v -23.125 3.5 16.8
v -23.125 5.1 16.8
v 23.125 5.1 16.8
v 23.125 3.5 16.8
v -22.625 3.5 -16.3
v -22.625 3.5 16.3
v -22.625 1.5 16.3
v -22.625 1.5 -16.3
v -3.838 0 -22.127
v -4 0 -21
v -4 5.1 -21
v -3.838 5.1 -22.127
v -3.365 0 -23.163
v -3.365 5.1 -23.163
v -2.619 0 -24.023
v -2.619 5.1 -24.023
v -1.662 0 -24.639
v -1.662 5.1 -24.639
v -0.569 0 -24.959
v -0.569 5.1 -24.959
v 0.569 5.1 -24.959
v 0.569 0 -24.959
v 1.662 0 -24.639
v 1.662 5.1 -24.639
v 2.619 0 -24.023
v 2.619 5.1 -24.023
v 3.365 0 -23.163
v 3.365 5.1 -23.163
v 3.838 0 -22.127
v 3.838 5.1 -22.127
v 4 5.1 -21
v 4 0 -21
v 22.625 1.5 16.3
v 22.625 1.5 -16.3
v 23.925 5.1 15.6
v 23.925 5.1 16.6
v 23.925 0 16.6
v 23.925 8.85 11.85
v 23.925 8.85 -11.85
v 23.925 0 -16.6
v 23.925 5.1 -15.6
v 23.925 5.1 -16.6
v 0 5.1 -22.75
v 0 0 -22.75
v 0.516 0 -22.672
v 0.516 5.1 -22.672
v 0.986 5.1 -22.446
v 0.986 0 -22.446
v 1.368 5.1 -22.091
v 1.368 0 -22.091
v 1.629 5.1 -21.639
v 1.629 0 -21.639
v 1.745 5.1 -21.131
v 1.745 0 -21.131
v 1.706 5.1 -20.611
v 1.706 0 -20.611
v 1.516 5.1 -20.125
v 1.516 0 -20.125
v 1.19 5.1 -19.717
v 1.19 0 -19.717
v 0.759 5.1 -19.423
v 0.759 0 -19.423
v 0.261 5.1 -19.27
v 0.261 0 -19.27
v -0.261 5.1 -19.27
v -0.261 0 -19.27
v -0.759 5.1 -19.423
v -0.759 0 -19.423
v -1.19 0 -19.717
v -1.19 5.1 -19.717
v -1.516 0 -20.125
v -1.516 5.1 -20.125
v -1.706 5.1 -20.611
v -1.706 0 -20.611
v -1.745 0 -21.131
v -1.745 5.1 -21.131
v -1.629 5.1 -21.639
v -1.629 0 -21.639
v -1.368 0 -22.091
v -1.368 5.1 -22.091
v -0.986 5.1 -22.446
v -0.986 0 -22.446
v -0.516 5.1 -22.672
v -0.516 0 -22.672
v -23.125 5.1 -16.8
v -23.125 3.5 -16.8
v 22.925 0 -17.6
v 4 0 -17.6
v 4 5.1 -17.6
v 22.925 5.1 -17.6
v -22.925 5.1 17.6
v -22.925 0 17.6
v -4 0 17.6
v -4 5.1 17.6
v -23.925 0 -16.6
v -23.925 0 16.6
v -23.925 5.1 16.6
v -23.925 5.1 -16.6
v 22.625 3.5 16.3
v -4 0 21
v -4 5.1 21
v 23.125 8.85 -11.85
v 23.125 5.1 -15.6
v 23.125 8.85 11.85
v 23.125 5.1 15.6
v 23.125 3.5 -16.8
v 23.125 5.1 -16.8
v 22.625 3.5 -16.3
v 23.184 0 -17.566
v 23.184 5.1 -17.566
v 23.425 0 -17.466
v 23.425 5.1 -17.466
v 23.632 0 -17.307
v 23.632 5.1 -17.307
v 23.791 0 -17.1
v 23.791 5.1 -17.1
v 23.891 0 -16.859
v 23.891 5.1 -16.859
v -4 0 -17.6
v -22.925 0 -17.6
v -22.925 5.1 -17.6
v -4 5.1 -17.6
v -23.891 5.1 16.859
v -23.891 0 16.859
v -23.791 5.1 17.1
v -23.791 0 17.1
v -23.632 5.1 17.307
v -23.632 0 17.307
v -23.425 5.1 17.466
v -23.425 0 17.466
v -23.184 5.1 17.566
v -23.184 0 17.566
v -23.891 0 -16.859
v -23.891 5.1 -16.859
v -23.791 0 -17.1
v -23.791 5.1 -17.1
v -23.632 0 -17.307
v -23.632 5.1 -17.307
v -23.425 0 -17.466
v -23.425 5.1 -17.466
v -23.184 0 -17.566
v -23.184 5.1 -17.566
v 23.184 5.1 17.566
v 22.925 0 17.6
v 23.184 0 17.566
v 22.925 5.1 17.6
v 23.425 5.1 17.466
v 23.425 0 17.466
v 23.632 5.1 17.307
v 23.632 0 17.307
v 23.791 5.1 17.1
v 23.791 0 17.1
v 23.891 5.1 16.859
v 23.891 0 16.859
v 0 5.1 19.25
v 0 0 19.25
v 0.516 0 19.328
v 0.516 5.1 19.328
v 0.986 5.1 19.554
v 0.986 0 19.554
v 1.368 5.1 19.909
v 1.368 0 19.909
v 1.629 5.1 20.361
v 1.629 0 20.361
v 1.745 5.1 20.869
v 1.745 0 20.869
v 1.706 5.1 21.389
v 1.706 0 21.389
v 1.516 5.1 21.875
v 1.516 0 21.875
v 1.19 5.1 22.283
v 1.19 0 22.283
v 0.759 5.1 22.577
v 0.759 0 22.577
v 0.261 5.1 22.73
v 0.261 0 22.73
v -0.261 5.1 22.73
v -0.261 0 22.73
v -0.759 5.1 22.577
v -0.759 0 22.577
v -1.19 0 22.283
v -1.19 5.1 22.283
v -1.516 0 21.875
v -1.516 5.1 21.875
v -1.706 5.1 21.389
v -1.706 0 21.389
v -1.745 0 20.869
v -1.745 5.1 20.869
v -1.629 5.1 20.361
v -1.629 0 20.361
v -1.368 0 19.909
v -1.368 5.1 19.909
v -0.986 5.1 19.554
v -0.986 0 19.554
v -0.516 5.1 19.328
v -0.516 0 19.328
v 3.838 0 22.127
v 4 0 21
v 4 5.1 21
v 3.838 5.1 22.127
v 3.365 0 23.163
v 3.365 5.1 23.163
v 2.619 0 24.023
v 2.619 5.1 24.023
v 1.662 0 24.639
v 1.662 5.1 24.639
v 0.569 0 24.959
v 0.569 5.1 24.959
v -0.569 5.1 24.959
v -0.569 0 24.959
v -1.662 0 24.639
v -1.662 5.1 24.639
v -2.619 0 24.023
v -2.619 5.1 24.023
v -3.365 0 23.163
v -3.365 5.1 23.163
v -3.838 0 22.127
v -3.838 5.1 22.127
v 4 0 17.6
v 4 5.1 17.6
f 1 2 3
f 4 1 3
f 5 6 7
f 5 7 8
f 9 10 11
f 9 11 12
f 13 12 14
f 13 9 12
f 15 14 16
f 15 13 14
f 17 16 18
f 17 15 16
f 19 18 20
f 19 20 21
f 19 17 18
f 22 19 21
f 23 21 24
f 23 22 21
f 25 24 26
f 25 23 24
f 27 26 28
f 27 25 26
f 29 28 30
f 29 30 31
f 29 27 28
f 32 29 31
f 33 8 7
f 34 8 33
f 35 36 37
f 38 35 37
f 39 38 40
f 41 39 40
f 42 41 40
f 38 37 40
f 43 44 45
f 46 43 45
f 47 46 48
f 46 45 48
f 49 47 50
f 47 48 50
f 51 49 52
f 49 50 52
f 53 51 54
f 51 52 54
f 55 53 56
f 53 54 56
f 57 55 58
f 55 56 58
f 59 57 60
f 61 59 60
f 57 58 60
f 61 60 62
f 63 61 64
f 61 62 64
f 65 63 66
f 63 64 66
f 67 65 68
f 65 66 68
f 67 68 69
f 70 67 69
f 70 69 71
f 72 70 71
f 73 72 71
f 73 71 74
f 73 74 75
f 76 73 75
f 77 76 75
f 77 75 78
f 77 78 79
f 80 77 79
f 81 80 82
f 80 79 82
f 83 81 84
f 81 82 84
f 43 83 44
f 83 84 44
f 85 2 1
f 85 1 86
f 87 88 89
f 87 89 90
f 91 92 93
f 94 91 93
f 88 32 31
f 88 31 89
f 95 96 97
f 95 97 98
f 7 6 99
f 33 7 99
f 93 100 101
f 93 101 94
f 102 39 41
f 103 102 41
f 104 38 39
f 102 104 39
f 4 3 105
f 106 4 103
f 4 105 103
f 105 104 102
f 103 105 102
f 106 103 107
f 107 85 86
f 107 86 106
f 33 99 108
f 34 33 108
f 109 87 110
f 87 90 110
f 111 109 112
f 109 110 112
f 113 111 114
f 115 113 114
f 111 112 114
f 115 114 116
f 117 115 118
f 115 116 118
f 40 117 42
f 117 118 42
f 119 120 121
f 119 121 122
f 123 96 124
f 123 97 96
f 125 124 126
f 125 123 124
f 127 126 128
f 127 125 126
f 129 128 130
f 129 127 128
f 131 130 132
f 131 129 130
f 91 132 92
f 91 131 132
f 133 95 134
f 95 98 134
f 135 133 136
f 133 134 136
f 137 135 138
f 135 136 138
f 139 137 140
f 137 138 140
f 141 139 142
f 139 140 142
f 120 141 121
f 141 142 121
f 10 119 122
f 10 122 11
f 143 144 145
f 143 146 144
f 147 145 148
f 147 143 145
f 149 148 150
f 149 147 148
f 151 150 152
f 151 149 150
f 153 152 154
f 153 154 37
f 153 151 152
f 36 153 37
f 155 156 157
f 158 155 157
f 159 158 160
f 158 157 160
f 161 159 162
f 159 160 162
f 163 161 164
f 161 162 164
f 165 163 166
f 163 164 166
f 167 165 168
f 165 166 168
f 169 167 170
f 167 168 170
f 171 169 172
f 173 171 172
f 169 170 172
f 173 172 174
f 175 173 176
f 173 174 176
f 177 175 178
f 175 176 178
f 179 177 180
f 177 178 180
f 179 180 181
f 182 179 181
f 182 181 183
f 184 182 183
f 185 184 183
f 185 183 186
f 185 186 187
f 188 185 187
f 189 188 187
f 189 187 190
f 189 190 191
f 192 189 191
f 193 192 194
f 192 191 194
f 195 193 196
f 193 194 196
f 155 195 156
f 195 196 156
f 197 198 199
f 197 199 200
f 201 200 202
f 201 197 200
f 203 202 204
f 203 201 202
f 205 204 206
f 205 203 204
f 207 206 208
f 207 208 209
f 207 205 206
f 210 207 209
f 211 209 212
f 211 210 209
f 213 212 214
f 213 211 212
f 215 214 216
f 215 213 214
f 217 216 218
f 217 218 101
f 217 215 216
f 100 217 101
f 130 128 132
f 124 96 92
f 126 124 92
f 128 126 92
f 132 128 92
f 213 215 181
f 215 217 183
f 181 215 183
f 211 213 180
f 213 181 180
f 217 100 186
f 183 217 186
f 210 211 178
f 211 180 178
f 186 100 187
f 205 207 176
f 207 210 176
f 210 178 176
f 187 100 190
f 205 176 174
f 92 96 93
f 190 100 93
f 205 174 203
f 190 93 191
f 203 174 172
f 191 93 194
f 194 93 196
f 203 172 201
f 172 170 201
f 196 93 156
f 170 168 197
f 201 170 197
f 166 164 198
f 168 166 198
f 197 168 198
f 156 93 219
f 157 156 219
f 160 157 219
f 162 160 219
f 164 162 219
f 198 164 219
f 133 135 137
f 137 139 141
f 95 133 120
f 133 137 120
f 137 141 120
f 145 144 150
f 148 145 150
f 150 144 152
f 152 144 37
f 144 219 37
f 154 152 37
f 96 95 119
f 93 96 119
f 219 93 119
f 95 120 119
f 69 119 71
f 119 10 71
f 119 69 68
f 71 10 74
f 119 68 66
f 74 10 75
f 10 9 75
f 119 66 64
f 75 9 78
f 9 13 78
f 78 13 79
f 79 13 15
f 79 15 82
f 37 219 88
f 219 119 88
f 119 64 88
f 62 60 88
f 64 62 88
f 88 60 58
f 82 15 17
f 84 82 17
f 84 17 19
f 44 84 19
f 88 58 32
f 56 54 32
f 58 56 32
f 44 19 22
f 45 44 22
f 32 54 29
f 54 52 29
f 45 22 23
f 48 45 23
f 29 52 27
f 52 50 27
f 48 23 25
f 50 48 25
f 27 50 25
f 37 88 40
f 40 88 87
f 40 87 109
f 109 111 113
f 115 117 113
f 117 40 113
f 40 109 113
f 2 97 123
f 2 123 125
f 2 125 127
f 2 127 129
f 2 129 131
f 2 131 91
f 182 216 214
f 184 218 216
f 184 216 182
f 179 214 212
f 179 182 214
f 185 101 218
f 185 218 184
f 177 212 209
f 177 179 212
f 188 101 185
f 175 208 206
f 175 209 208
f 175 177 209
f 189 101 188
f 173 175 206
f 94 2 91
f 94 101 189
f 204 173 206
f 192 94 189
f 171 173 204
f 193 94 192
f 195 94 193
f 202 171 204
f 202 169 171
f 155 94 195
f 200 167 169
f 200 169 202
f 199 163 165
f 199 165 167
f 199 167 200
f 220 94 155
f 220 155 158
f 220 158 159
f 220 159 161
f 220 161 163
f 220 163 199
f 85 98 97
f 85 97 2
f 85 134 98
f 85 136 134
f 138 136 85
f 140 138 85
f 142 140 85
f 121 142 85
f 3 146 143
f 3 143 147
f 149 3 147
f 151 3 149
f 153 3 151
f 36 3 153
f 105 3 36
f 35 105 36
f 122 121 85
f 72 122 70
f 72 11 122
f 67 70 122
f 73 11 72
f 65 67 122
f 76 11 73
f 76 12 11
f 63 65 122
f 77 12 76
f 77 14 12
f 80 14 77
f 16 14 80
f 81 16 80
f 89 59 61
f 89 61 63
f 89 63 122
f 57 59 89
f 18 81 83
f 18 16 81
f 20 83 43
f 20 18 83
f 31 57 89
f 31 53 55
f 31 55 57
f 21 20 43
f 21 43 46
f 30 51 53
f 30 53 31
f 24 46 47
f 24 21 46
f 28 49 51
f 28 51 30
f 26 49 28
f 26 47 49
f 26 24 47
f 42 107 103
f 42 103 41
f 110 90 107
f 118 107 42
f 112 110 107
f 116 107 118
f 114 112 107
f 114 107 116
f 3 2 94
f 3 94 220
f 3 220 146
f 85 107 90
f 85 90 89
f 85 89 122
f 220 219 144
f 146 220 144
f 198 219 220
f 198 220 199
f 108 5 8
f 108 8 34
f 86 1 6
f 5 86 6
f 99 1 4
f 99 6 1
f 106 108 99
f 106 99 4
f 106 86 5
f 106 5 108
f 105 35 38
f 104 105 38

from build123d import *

# Parameters (mm, degrees)
SKETCH1_W           = 47.85
SKETCH1_H           = 35.2
BOSS_EXTRUDE1_DEPTH = 5.1
SKETCH2_W           = 46.25
SKETCH2_H           = 33.6
CUT_EXTRUDE1_DEPTH  = 1.6
SKETCH3_W           = 45.25
SKETCH3_H           = 32.6
CUT_EXTRUDE2_DEPTH  = 2
BOSS_EXTRUDE2_DEPTH = 0.8
FILLET1_R           = 1
SKETCH6_R           = 1.75
BOSS_EXTRUDE3_DEPTH = 5.1


with BuildPart() as part:
    # Sketch1 → Boss-Extrude1 (new body)
    with BuildSketch(Plane(origin=(0, 0, 0), x_dir=(1, 0, 0), z_dir=(0, 1, 0))):
        Rectangle(SKETCH1_W, SKETCH1_H)
    extrude(amount=BOSS_EXTRUDE1_DEPTH)

    # Sketch2 → Cut-Extrude1 (cut)
    with BuildSketch(Plane(origin=(0, 5.1, 0), x_dir=(1, 0, 0), z_dir=(0, 1, 0))):
        Rectangle(SKETCH2_W, SKETCH2_H)
    extrude(amount=-CUT_EXTRUDE1_DEPTH, mode=Mode.SUBTRACT)

    # Sketch3 → Cut-Extrude2 (cut)
    with BuildSketch(Plane(origin=(0, 3.5, 0), x_dir=(1, 0, 0), z_dir=(0, 1, 0))):
        Rectangle(SKETCH3_W, SKETCH3_H)
    extrude(amount=-CUT_EXTRUDE2_DEPTH, mode=Mode.SUBTRACT)

    # Sketch4 → Boss-Extrude2 (add)
    with BuildSketch(Plane(origin=(23.925, 0, 0), x_dir=(0, 0, -1), z_dir=(1, 0, 0))):
        Polygon((-15.6, 5.1), (-11.85, 8.85), (11.85, 8.85), (15.6, 5.1), align=None)
    extrude(amount=-BOSS_EXTRUDE2_DEPTH)

    # Fillet1
    fillet1_edges = [part.edges().sort_by_distance(p)[0] for p in [
        (-23.925, 2.55, -17.6),
        (23.925, 2.55, -17.6),
        (23.925, 2.55, 17.6),
        (-23.925, 2.55, 17.6),
    ]]
    fillet(fillet1_edges, radius=FILLET1_R)

    # Sketch6 → Boss-Extrude3 (add)
    # profile 1 of 2: a face of its own
    with BuildSketch(Plane.XZ):
        with BuildLine():
            Line((-4, 17.6), (4, 17.6))
            Line((4, 17.6), (4, 21))
            ThreePointArc((4, 21), (0, 25), (-4, 21))
            Line((-4, 21), (-4, 17.6))
        make_face()
        with Locations(Location((0, 21, 0), (0, 0, 270))):
            Circle(SKETCH6_R, mode=Mode.SUBTRACT)
    # profile 2 of 2: a face of its own
    with BuildSketch(Plane.XZ):
        with BuildLine():
            Line((-4, -17.6), (-4, -21))
            ThreePointArc((-4, -21), (0, -25), (4, -21))
            Line((4, -21), (4, -17.6))
            Line((4, -17.6), (-4, -17.6))
        make_face()
        with Locations(Location((0, -21, 0), (0, 0, 270))):
            Circle(SKETCH6_R, mode=Mode.SUBTRACT)
    extrude(amount=-BOSS_EXTRUDE3_DEPTH)


solid = part.part
